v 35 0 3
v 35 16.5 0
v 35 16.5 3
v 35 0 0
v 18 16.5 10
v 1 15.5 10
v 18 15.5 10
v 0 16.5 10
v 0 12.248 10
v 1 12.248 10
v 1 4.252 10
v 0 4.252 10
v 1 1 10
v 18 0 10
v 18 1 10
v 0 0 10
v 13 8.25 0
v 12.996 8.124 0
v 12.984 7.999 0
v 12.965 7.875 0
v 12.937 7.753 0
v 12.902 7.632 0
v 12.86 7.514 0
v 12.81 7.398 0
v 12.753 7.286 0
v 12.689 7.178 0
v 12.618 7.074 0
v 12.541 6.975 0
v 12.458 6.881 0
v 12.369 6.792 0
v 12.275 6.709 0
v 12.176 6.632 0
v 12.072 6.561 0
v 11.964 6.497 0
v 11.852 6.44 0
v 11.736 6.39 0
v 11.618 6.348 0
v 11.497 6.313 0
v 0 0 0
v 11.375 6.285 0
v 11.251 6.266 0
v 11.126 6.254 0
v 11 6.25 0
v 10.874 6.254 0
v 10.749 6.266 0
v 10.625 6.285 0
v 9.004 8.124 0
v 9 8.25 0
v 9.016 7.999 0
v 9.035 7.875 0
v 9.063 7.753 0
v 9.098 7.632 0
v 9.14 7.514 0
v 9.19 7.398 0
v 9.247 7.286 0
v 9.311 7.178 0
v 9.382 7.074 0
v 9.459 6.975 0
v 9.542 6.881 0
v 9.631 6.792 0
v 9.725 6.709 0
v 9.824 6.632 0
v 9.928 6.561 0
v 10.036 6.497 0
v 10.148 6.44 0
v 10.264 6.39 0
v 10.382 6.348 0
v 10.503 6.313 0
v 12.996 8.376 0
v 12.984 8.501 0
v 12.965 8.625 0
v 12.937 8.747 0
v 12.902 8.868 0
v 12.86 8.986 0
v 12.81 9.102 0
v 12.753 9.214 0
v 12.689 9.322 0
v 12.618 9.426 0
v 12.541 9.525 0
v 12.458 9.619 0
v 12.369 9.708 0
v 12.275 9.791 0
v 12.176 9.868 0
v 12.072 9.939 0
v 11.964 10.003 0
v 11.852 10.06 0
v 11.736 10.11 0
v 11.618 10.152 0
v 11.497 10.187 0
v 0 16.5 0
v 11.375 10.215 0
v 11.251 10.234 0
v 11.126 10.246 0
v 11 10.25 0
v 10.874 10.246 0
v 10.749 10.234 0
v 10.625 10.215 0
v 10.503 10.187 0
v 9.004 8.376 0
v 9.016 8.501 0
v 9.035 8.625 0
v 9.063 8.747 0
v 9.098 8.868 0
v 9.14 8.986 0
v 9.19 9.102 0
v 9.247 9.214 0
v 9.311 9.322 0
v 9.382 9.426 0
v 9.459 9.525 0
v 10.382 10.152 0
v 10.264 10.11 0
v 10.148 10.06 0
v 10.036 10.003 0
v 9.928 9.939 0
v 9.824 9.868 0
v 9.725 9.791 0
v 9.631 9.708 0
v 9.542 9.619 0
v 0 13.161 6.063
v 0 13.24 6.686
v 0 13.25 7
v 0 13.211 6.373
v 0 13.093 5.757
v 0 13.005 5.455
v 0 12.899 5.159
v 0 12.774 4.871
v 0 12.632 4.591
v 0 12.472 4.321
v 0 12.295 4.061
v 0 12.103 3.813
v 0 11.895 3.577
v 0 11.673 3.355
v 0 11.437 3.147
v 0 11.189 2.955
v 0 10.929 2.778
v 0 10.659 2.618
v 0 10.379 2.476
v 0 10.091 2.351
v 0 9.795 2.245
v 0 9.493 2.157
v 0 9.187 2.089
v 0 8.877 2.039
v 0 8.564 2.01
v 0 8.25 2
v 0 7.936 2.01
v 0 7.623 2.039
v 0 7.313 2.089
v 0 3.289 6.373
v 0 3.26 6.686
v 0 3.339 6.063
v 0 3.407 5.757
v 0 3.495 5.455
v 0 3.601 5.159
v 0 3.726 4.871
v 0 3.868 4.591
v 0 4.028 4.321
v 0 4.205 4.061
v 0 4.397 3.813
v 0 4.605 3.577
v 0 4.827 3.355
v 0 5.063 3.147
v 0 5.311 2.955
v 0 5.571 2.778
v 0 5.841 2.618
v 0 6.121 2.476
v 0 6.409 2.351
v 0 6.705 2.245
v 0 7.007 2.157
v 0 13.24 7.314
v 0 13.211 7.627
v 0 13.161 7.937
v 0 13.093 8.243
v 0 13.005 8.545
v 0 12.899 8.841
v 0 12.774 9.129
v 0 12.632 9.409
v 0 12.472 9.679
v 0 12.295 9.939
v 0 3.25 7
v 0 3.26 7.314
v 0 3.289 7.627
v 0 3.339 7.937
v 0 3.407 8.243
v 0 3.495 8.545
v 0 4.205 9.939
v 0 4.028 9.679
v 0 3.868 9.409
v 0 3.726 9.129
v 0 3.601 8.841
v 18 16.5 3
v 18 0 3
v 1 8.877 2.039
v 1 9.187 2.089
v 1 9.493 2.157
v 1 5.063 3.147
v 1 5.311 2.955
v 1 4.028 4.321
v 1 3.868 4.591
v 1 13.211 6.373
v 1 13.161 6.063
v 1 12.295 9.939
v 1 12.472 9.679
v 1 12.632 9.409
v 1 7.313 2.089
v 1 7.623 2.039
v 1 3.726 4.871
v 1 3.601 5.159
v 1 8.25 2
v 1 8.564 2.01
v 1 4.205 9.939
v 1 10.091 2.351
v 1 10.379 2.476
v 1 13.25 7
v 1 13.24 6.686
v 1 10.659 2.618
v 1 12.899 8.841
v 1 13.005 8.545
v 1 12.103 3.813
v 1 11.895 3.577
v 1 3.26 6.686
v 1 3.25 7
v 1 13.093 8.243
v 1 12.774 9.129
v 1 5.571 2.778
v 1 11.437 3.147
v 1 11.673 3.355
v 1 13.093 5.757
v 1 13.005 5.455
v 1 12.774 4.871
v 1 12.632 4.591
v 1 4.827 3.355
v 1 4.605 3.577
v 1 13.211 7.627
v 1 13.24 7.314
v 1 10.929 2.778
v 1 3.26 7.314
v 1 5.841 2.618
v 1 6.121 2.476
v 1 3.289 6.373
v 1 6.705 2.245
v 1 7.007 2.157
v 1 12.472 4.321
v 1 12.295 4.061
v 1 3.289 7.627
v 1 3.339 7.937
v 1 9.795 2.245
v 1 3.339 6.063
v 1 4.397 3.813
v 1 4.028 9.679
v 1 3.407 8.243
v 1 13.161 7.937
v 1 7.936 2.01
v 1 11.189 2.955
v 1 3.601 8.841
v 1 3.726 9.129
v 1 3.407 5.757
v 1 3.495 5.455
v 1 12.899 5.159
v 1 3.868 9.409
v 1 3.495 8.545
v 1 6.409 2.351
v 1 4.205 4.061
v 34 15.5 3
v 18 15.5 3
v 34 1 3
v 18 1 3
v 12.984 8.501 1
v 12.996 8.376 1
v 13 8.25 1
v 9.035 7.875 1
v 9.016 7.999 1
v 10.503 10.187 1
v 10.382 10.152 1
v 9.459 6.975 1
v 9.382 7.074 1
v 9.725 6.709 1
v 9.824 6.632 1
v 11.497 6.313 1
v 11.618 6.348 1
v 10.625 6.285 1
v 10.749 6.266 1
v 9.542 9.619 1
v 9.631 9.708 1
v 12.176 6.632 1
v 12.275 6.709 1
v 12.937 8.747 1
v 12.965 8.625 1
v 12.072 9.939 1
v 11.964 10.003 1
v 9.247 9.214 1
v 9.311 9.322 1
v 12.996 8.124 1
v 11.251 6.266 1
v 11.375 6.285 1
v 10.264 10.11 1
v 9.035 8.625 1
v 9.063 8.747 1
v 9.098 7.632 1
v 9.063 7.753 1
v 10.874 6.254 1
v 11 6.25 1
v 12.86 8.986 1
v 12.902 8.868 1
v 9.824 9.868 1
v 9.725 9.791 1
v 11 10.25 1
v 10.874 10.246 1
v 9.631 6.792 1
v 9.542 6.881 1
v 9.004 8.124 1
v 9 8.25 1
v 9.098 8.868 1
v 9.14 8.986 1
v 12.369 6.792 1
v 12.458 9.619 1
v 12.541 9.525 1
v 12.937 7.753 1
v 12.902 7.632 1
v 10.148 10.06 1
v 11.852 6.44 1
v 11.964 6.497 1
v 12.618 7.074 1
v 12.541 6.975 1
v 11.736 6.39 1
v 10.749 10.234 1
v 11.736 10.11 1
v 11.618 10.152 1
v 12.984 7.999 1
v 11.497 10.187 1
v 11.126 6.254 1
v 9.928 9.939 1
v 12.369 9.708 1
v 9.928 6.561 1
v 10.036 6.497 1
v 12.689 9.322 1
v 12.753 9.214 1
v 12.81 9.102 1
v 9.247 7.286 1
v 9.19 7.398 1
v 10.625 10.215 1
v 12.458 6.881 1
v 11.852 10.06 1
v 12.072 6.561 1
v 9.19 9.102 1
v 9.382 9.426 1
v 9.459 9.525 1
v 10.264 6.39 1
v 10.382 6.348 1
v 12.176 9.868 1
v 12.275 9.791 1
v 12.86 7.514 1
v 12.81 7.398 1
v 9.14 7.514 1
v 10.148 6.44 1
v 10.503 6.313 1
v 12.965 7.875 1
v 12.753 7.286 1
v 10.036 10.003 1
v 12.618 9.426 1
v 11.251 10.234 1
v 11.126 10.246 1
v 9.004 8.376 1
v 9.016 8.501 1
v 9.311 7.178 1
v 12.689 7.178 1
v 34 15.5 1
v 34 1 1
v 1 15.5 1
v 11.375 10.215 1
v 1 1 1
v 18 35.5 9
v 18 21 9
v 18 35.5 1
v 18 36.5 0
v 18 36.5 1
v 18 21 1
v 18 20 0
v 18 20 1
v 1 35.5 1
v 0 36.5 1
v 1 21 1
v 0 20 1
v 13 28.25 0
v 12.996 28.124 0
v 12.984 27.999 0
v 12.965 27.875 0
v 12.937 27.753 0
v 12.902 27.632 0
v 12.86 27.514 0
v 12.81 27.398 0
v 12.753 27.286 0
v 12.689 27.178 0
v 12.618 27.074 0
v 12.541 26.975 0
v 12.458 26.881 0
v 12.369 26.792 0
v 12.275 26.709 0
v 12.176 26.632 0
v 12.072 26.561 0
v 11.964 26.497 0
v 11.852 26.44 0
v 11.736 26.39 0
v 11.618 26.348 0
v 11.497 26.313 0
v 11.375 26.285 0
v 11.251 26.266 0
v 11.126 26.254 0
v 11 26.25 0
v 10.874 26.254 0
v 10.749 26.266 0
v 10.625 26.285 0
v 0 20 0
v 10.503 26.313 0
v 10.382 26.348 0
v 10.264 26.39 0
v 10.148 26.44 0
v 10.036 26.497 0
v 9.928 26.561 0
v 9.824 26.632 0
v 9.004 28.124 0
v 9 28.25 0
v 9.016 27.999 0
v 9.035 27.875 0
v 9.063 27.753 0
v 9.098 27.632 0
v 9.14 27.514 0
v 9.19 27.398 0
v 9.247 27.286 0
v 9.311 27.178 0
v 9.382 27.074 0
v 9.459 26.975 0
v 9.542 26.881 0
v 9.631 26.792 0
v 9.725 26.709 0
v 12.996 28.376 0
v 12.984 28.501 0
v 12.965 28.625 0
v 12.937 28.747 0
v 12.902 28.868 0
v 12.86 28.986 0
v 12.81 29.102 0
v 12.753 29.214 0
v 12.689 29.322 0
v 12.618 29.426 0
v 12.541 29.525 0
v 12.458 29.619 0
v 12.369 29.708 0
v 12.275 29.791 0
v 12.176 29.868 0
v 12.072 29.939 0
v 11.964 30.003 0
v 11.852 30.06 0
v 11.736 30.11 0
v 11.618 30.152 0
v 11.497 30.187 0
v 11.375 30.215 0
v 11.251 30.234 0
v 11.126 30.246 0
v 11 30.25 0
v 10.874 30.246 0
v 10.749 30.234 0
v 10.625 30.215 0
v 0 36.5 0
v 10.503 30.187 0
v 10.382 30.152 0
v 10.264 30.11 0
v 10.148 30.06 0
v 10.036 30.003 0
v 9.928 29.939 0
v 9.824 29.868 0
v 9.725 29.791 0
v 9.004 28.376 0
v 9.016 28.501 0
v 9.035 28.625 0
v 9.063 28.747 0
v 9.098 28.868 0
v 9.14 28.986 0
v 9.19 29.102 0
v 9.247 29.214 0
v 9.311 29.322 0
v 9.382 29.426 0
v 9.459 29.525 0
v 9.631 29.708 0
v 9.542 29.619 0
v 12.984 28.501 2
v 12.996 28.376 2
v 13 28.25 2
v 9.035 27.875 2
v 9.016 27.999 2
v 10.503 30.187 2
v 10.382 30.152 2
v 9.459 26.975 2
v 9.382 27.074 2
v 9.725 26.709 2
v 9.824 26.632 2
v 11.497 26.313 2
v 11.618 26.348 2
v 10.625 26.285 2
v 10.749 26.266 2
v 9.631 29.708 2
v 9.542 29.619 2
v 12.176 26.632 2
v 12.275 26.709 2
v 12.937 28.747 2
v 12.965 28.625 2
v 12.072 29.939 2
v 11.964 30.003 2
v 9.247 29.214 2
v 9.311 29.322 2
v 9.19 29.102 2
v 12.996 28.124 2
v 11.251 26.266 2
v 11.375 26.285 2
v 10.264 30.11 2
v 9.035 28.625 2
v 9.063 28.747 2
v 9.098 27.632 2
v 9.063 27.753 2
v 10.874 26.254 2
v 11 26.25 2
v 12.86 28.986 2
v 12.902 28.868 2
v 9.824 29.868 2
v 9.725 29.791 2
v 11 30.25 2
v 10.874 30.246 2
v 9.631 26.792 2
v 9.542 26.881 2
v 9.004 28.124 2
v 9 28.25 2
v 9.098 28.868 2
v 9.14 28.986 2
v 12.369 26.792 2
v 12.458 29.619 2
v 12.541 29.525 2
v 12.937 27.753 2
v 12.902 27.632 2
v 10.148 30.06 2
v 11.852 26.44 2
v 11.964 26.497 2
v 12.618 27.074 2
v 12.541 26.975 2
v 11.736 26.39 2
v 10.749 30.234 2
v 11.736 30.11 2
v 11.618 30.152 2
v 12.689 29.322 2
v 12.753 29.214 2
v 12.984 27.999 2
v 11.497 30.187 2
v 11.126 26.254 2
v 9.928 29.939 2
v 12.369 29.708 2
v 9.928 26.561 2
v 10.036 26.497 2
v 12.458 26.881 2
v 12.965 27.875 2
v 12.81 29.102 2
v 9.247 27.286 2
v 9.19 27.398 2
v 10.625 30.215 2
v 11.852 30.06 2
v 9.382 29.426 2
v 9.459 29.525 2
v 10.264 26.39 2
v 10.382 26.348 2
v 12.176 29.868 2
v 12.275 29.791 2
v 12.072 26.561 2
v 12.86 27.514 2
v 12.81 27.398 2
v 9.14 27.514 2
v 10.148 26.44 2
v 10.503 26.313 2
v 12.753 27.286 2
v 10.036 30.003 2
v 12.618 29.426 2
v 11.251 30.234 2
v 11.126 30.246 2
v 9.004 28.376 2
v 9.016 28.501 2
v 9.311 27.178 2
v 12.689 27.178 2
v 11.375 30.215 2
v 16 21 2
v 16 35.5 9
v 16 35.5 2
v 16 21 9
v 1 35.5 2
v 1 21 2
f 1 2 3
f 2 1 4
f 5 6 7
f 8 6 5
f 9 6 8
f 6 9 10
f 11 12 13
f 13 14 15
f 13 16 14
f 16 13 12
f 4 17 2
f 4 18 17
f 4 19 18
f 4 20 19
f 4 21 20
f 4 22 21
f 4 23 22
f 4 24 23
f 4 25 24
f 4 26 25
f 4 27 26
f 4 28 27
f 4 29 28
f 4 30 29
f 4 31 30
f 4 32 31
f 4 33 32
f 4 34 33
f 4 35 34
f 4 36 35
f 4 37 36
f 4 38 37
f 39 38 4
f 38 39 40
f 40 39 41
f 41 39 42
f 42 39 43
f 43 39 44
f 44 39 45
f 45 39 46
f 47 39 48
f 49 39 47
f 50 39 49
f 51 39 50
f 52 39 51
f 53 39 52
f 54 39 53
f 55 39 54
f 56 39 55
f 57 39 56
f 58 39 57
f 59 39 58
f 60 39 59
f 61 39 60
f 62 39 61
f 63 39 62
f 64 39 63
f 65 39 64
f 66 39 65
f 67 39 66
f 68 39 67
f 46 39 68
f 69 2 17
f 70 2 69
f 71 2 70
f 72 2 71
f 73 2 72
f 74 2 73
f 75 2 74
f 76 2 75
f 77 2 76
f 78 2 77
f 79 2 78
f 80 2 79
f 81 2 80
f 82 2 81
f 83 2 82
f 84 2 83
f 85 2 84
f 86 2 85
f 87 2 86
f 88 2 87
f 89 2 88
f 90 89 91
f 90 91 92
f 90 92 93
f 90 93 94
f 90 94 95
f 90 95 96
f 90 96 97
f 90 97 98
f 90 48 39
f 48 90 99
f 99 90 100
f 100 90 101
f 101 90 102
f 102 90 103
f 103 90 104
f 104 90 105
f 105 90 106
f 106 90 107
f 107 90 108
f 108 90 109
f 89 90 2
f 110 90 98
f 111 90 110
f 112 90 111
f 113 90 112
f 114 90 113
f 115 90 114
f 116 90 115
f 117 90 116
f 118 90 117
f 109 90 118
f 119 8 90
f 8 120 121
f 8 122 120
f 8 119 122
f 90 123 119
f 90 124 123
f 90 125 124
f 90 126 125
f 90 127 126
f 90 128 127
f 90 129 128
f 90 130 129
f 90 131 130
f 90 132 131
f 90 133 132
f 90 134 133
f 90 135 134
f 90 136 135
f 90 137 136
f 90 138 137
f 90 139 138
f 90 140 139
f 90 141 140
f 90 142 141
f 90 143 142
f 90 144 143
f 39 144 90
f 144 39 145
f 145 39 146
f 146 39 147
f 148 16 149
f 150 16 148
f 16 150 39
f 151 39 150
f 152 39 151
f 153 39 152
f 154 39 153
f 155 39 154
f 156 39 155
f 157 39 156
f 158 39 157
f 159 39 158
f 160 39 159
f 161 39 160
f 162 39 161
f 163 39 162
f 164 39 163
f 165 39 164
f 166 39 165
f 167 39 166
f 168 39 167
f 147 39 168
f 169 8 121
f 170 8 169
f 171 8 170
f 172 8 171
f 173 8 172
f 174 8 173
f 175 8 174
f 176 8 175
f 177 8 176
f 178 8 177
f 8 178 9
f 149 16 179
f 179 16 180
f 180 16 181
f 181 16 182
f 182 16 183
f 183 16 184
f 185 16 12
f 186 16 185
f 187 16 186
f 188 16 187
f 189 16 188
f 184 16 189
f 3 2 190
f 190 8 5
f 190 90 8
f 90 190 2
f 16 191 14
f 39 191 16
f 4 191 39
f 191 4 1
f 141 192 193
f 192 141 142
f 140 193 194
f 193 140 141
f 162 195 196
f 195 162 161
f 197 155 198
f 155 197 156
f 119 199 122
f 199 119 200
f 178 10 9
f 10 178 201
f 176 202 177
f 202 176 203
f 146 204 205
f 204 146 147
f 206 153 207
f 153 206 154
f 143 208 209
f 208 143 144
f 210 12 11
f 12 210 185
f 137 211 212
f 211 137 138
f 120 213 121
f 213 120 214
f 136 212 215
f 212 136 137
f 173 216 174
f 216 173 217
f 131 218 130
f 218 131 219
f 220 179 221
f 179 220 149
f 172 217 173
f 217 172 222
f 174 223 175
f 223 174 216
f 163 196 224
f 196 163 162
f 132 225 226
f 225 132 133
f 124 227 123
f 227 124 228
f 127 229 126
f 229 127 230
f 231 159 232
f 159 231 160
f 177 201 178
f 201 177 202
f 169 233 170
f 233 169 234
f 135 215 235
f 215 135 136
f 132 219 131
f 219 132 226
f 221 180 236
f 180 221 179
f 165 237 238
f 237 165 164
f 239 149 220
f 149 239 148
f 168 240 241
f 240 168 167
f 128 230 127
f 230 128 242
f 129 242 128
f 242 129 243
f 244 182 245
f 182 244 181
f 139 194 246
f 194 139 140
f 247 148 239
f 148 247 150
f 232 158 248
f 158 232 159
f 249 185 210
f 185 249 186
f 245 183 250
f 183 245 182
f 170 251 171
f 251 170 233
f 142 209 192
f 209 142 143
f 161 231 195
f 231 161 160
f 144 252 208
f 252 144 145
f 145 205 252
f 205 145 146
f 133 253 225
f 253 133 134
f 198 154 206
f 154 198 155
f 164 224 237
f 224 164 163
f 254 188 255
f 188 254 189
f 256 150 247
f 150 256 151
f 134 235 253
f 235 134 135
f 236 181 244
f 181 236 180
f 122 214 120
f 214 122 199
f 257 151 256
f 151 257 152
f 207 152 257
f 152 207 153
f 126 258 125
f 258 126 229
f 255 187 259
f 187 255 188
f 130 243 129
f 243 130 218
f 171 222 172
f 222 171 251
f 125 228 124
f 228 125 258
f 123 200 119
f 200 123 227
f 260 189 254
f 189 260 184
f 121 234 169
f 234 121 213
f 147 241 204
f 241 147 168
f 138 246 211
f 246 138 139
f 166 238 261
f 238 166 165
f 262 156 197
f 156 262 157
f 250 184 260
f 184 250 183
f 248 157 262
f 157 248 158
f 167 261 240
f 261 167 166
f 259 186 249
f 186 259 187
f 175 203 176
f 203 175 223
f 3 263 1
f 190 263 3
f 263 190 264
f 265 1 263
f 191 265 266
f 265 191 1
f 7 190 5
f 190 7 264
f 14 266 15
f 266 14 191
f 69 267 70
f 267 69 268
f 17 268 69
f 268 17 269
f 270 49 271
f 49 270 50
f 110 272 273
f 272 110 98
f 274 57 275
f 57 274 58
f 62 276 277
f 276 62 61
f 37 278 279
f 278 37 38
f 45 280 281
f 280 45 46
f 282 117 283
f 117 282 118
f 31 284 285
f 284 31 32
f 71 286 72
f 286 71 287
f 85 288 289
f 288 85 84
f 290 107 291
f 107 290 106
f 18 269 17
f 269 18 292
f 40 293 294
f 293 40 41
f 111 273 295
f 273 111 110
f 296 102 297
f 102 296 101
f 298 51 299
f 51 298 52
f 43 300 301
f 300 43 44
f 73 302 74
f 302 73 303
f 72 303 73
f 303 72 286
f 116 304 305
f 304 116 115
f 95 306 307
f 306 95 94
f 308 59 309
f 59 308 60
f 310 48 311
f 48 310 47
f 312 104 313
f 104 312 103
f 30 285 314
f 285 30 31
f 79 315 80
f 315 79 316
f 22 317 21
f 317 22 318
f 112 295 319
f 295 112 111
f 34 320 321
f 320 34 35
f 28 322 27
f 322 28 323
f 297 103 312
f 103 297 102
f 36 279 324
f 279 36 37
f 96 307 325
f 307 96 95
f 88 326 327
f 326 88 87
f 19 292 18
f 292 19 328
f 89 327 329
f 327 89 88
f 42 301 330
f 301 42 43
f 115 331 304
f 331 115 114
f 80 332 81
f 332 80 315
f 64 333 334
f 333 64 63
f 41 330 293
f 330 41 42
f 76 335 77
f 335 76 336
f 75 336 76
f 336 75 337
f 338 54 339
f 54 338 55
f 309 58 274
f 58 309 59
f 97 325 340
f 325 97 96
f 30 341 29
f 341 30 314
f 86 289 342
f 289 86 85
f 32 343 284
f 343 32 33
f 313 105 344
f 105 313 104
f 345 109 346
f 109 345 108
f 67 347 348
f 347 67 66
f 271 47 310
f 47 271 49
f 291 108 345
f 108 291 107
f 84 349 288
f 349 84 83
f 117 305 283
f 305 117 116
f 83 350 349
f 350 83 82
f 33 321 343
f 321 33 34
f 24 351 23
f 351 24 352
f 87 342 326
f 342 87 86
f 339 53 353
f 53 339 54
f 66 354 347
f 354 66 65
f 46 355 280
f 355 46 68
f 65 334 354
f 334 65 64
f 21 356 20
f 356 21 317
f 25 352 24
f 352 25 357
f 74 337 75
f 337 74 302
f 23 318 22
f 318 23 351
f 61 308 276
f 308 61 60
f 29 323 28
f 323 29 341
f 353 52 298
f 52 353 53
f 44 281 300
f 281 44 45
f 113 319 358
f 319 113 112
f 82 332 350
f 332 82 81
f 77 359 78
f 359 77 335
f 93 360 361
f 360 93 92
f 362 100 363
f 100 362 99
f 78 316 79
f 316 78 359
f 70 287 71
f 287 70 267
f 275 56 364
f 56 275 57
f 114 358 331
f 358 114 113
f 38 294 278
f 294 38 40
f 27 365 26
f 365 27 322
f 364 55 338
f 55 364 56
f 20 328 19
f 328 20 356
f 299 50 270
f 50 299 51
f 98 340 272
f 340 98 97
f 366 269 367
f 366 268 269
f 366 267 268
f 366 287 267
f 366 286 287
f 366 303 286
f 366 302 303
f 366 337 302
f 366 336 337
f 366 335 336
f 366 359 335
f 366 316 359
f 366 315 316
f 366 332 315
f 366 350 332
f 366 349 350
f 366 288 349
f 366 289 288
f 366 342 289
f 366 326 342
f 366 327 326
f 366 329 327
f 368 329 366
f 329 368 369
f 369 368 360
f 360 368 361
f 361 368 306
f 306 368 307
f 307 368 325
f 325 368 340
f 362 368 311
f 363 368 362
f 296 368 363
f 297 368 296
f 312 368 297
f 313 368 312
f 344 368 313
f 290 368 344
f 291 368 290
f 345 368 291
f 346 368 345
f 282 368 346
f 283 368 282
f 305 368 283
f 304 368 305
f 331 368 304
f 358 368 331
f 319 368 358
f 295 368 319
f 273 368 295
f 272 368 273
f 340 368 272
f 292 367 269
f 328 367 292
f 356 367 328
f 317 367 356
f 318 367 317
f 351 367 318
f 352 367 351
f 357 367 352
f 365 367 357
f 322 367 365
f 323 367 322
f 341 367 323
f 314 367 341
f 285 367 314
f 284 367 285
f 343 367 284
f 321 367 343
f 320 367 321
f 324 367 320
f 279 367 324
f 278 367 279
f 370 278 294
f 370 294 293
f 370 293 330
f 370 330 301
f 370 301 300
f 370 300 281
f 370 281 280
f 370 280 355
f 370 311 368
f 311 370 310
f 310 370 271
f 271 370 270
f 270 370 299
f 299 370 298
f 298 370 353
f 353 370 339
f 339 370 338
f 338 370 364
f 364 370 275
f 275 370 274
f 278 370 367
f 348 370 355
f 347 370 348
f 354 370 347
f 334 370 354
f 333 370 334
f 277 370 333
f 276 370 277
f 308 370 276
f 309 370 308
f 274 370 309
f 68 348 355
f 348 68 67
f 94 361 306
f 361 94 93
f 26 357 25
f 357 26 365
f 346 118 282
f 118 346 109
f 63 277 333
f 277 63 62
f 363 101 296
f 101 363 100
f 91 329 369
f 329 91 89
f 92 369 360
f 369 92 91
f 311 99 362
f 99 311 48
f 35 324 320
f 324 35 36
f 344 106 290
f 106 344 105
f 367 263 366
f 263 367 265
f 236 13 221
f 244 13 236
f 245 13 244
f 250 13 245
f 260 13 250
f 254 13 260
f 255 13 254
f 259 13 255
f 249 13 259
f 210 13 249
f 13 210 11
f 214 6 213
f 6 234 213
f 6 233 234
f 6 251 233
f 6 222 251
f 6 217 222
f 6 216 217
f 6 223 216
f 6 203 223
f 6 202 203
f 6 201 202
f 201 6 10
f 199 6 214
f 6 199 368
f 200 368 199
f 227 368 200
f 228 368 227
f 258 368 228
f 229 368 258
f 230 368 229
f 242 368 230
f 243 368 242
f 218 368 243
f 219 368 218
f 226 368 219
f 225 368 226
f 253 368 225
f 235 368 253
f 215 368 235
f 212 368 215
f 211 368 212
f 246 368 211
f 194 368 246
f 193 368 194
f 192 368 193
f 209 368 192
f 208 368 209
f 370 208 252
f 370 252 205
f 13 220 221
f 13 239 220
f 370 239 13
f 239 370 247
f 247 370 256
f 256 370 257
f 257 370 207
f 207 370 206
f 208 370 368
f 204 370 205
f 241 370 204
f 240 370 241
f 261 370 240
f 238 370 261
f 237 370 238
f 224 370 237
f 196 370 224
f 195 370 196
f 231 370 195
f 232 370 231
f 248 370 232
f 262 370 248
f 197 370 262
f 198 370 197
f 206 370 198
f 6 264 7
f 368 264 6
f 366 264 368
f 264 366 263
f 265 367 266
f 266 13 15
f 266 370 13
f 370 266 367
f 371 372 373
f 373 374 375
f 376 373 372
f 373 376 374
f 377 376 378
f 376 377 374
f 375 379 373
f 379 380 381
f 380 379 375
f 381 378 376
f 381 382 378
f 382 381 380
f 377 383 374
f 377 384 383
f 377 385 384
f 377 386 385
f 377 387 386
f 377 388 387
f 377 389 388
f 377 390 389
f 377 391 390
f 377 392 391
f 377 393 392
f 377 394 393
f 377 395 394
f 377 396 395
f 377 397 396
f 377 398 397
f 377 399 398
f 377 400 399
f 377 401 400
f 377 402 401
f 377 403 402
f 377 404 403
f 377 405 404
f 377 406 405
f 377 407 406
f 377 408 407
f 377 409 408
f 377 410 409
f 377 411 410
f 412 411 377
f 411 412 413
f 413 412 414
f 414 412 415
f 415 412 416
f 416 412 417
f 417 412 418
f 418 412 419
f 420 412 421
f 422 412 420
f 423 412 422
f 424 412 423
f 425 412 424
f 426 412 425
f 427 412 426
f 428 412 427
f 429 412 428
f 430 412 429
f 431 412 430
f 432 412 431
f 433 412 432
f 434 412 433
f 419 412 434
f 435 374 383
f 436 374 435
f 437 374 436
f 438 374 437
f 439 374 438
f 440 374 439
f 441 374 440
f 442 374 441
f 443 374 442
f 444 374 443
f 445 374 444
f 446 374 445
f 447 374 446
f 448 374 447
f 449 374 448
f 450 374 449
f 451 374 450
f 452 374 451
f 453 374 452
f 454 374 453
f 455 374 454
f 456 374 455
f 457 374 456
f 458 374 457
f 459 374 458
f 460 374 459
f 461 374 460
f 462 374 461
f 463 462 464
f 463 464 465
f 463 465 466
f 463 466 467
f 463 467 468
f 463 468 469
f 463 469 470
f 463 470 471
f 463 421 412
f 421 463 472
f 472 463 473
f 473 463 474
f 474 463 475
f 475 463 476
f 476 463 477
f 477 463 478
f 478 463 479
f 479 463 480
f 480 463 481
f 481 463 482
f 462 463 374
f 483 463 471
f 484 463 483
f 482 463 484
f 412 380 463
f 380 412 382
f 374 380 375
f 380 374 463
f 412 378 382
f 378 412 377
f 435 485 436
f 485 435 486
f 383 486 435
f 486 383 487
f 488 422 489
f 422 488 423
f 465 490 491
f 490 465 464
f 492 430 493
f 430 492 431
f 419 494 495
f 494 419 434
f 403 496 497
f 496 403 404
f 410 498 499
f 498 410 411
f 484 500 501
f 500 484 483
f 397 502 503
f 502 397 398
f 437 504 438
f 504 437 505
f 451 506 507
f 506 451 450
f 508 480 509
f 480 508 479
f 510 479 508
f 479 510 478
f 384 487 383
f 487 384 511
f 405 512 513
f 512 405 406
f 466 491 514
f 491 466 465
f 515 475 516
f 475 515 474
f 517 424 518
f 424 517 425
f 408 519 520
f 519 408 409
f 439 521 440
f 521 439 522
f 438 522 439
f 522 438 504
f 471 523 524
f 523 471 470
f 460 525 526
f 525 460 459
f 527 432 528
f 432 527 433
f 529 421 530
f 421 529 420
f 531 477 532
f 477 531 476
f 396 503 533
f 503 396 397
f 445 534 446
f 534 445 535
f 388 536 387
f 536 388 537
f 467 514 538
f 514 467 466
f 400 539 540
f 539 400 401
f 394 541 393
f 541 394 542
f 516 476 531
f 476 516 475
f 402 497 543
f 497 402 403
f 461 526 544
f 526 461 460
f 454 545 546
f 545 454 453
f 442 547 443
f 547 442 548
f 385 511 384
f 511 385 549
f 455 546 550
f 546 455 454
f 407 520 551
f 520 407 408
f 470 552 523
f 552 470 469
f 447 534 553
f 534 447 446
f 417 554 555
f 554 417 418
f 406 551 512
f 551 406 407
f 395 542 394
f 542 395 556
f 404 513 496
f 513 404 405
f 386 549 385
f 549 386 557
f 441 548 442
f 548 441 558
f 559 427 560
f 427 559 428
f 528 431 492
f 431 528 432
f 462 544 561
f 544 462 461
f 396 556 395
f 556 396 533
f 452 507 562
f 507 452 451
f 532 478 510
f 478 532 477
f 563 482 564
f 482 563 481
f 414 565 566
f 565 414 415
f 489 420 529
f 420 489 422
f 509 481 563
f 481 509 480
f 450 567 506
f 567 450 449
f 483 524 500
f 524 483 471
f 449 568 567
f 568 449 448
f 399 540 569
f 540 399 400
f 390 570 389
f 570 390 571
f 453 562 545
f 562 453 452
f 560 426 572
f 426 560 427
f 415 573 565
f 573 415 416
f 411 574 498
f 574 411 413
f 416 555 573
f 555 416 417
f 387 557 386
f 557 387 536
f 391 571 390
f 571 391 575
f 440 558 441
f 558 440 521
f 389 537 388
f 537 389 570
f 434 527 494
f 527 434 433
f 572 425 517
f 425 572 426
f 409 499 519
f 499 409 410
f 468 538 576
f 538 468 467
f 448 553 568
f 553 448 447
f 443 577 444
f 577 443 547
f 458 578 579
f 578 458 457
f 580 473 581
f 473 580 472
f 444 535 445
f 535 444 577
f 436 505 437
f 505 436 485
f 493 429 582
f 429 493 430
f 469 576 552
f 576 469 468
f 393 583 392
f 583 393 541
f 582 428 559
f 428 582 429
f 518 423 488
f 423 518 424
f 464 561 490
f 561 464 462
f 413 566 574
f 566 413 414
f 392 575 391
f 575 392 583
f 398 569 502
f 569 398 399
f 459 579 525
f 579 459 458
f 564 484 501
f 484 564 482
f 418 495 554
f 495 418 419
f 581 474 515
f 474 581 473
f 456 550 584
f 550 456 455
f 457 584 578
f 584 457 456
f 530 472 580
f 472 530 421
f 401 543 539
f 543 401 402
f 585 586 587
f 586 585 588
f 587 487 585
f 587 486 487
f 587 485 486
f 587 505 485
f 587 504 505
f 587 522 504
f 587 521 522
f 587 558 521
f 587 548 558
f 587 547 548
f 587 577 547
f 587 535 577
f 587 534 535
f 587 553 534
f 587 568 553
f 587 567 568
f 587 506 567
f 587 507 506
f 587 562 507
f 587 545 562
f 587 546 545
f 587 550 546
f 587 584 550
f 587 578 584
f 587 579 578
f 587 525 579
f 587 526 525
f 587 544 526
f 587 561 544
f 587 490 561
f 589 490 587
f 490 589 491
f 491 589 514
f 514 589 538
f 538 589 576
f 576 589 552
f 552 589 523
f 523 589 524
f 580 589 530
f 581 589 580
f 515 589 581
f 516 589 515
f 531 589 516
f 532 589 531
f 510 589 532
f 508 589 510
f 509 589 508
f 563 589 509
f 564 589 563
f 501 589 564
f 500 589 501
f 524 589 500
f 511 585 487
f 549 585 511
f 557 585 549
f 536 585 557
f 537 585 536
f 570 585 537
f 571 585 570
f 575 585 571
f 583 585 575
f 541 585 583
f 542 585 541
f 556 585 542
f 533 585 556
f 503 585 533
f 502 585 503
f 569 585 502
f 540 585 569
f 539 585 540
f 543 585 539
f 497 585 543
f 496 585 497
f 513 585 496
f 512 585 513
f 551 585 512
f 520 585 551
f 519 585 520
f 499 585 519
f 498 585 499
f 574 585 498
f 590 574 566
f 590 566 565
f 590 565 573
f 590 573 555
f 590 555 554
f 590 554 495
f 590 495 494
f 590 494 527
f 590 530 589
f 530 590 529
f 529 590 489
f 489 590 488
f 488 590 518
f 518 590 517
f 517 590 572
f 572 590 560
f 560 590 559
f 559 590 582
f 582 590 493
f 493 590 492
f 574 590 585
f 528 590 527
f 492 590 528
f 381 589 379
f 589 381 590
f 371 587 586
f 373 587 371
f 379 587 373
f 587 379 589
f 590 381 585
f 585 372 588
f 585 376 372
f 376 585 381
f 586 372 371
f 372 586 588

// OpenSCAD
$fn=100;
difference(){
    cube([35,16.5,10]);
    
    
    translate([0,16.5/2,7])
    rotate([0,90,0])
    cylinder(r=5,h=10);
    
    translate([18,0,3])
    cube([25,16.5,7]);
    
    translate([11,16.5/2,0])
     cylinder(r=2,h=1);
    translate([1,1,1])
    cube([33,14.5,10]);
    
}

translate([0,20,0]){
    difference(){
        cube([35-17,16.5,1]);
        translate([11,16.5/2,0])
        cylinder(r=2,h=1);
        
    }
}
translate([1,21,1]){
    difference(){
        cube([35-18-2,16.5-2,1]);
        translate([10,14.5/2,0])
        cylinder(r=2,h=1);
        
    }
    translate([15,0,-1])
    cube([2,16.5-2,9]);
}
